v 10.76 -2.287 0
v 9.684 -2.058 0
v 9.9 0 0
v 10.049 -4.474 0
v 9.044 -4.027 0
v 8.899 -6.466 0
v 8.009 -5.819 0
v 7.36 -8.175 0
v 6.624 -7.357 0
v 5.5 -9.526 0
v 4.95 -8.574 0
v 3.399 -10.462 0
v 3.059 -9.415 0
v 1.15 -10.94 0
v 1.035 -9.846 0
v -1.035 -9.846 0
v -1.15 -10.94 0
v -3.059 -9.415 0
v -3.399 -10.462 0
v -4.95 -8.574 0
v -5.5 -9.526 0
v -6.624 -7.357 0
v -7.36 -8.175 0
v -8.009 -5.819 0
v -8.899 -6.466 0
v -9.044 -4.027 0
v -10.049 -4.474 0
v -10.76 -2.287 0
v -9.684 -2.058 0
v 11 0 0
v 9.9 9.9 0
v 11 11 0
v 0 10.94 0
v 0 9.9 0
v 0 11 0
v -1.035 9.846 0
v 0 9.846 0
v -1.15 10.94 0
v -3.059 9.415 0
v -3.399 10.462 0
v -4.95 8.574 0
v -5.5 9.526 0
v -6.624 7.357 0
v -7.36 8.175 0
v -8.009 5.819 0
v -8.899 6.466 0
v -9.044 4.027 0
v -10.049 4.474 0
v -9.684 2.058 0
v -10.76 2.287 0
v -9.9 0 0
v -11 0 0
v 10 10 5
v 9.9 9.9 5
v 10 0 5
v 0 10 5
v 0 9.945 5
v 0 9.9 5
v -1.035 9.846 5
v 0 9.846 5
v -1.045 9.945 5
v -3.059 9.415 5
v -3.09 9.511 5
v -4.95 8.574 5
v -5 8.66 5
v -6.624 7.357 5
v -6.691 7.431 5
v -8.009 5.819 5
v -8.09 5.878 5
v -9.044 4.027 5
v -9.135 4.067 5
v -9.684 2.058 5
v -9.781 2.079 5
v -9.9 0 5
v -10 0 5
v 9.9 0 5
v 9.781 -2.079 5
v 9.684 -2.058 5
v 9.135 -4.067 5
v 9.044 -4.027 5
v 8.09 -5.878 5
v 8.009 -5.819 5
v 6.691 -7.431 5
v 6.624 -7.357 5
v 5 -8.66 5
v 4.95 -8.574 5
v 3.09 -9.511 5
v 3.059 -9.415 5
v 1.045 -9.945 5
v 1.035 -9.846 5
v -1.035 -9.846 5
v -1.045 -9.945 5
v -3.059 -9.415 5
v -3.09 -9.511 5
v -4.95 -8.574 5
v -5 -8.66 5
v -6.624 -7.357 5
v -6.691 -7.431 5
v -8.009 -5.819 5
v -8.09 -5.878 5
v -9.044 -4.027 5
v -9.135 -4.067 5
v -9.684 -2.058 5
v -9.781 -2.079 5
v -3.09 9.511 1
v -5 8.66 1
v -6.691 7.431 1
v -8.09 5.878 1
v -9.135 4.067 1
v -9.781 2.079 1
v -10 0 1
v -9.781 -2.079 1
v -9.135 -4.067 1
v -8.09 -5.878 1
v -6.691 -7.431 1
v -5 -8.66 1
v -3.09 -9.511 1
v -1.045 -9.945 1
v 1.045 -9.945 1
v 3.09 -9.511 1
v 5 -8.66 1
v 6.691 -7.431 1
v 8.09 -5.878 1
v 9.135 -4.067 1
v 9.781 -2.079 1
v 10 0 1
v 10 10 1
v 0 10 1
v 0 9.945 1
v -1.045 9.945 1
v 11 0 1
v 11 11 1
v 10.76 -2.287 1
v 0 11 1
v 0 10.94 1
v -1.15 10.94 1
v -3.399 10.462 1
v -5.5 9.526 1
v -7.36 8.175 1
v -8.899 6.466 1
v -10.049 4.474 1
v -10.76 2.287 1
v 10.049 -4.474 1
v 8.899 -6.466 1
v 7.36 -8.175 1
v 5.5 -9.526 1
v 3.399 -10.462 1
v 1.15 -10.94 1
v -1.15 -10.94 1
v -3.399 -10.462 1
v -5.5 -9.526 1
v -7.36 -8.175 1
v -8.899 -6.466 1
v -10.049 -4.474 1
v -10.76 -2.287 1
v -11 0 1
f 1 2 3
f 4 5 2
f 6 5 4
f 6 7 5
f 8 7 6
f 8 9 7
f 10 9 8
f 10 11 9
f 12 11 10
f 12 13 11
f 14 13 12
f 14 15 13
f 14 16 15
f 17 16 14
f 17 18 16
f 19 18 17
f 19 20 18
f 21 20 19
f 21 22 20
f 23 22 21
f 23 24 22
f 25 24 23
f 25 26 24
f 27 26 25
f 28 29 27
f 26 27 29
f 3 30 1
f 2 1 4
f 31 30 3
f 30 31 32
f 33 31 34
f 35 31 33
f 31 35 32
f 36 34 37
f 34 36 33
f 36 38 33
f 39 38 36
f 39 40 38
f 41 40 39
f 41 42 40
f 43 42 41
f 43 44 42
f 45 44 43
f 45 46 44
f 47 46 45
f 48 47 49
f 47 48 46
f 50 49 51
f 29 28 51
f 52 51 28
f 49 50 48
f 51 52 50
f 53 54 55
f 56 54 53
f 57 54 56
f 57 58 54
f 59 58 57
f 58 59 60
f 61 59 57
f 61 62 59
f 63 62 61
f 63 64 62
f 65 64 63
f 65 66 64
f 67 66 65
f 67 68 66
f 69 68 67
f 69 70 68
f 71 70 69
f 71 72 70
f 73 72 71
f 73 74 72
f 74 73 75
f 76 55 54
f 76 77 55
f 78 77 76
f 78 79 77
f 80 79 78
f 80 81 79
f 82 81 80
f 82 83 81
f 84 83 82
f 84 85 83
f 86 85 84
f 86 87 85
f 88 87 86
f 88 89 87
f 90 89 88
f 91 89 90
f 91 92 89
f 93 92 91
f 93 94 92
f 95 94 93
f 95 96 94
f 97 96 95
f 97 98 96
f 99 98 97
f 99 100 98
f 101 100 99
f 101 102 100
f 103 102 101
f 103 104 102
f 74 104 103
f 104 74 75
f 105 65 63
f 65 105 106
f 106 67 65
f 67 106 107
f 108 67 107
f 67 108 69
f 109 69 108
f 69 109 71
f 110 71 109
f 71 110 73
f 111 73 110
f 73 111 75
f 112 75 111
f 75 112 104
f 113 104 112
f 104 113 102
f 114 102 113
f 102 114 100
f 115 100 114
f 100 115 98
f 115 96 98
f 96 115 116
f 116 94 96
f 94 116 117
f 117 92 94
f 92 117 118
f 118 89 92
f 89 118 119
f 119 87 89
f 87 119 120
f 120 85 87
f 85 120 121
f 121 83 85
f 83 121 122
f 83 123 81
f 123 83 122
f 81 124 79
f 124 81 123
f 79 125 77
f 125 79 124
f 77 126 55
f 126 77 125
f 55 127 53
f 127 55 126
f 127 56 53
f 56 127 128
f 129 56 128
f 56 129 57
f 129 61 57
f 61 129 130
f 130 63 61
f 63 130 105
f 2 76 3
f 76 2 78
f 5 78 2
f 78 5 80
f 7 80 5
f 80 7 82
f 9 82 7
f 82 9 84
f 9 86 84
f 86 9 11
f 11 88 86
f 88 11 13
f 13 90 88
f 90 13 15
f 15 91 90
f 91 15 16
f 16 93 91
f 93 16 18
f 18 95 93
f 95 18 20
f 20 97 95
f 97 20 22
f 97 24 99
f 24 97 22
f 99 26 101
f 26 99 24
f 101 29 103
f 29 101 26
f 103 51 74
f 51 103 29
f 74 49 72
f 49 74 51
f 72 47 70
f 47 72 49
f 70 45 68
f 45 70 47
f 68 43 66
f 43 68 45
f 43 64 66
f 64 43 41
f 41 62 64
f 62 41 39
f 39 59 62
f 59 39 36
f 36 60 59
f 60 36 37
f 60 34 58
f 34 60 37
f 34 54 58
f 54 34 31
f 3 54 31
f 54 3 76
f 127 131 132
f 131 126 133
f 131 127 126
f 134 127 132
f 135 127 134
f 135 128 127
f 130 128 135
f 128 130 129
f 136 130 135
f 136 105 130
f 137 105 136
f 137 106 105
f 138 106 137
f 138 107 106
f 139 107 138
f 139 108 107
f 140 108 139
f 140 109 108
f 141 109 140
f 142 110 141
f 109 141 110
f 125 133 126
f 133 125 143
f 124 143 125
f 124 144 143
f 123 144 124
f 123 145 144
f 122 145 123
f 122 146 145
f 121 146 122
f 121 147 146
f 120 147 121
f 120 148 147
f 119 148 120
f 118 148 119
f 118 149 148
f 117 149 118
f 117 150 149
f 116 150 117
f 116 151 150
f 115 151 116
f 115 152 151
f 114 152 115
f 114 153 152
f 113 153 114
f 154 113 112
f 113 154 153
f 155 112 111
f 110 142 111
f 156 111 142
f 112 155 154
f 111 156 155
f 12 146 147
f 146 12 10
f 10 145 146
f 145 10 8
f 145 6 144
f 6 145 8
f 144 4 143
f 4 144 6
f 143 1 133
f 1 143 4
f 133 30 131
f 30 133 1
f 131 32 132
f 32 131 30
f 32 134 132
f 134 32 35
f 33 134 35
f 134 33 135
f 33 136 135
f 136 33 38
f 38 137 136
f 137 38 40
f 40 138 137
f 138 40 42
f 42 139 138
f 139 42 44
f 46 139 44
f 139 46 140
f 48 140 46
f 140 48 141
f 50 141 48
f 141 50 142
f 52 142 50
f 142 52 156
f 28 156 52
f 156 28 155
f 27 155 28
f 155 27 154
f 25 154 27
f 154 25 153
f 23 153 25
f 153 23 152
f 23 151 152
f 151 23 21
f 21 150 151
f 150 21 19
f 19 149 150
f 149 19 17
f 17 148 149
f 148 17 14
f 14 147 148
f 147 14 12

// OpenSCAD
diam=10;
topthickness=1;
cutthickness=0.1;
topheight=1;
cutheight=5;

module cookie(r=10,rim=1){
	union(){
		difference(){
			square([r,r]);
			square([r-rim,r-rim]);
			circle(r=10);
		}
		difference(){
			circle(r=r);
			circle(r=r-rim);
			square([r-rim,r-rim]);
		}
	}
}
linear_extrude(height=cutheight) cookie(diam,cutthickness);
linear_extrude(height=topheight) cookie(topthickness+diam,cutthickness+topthickness);
